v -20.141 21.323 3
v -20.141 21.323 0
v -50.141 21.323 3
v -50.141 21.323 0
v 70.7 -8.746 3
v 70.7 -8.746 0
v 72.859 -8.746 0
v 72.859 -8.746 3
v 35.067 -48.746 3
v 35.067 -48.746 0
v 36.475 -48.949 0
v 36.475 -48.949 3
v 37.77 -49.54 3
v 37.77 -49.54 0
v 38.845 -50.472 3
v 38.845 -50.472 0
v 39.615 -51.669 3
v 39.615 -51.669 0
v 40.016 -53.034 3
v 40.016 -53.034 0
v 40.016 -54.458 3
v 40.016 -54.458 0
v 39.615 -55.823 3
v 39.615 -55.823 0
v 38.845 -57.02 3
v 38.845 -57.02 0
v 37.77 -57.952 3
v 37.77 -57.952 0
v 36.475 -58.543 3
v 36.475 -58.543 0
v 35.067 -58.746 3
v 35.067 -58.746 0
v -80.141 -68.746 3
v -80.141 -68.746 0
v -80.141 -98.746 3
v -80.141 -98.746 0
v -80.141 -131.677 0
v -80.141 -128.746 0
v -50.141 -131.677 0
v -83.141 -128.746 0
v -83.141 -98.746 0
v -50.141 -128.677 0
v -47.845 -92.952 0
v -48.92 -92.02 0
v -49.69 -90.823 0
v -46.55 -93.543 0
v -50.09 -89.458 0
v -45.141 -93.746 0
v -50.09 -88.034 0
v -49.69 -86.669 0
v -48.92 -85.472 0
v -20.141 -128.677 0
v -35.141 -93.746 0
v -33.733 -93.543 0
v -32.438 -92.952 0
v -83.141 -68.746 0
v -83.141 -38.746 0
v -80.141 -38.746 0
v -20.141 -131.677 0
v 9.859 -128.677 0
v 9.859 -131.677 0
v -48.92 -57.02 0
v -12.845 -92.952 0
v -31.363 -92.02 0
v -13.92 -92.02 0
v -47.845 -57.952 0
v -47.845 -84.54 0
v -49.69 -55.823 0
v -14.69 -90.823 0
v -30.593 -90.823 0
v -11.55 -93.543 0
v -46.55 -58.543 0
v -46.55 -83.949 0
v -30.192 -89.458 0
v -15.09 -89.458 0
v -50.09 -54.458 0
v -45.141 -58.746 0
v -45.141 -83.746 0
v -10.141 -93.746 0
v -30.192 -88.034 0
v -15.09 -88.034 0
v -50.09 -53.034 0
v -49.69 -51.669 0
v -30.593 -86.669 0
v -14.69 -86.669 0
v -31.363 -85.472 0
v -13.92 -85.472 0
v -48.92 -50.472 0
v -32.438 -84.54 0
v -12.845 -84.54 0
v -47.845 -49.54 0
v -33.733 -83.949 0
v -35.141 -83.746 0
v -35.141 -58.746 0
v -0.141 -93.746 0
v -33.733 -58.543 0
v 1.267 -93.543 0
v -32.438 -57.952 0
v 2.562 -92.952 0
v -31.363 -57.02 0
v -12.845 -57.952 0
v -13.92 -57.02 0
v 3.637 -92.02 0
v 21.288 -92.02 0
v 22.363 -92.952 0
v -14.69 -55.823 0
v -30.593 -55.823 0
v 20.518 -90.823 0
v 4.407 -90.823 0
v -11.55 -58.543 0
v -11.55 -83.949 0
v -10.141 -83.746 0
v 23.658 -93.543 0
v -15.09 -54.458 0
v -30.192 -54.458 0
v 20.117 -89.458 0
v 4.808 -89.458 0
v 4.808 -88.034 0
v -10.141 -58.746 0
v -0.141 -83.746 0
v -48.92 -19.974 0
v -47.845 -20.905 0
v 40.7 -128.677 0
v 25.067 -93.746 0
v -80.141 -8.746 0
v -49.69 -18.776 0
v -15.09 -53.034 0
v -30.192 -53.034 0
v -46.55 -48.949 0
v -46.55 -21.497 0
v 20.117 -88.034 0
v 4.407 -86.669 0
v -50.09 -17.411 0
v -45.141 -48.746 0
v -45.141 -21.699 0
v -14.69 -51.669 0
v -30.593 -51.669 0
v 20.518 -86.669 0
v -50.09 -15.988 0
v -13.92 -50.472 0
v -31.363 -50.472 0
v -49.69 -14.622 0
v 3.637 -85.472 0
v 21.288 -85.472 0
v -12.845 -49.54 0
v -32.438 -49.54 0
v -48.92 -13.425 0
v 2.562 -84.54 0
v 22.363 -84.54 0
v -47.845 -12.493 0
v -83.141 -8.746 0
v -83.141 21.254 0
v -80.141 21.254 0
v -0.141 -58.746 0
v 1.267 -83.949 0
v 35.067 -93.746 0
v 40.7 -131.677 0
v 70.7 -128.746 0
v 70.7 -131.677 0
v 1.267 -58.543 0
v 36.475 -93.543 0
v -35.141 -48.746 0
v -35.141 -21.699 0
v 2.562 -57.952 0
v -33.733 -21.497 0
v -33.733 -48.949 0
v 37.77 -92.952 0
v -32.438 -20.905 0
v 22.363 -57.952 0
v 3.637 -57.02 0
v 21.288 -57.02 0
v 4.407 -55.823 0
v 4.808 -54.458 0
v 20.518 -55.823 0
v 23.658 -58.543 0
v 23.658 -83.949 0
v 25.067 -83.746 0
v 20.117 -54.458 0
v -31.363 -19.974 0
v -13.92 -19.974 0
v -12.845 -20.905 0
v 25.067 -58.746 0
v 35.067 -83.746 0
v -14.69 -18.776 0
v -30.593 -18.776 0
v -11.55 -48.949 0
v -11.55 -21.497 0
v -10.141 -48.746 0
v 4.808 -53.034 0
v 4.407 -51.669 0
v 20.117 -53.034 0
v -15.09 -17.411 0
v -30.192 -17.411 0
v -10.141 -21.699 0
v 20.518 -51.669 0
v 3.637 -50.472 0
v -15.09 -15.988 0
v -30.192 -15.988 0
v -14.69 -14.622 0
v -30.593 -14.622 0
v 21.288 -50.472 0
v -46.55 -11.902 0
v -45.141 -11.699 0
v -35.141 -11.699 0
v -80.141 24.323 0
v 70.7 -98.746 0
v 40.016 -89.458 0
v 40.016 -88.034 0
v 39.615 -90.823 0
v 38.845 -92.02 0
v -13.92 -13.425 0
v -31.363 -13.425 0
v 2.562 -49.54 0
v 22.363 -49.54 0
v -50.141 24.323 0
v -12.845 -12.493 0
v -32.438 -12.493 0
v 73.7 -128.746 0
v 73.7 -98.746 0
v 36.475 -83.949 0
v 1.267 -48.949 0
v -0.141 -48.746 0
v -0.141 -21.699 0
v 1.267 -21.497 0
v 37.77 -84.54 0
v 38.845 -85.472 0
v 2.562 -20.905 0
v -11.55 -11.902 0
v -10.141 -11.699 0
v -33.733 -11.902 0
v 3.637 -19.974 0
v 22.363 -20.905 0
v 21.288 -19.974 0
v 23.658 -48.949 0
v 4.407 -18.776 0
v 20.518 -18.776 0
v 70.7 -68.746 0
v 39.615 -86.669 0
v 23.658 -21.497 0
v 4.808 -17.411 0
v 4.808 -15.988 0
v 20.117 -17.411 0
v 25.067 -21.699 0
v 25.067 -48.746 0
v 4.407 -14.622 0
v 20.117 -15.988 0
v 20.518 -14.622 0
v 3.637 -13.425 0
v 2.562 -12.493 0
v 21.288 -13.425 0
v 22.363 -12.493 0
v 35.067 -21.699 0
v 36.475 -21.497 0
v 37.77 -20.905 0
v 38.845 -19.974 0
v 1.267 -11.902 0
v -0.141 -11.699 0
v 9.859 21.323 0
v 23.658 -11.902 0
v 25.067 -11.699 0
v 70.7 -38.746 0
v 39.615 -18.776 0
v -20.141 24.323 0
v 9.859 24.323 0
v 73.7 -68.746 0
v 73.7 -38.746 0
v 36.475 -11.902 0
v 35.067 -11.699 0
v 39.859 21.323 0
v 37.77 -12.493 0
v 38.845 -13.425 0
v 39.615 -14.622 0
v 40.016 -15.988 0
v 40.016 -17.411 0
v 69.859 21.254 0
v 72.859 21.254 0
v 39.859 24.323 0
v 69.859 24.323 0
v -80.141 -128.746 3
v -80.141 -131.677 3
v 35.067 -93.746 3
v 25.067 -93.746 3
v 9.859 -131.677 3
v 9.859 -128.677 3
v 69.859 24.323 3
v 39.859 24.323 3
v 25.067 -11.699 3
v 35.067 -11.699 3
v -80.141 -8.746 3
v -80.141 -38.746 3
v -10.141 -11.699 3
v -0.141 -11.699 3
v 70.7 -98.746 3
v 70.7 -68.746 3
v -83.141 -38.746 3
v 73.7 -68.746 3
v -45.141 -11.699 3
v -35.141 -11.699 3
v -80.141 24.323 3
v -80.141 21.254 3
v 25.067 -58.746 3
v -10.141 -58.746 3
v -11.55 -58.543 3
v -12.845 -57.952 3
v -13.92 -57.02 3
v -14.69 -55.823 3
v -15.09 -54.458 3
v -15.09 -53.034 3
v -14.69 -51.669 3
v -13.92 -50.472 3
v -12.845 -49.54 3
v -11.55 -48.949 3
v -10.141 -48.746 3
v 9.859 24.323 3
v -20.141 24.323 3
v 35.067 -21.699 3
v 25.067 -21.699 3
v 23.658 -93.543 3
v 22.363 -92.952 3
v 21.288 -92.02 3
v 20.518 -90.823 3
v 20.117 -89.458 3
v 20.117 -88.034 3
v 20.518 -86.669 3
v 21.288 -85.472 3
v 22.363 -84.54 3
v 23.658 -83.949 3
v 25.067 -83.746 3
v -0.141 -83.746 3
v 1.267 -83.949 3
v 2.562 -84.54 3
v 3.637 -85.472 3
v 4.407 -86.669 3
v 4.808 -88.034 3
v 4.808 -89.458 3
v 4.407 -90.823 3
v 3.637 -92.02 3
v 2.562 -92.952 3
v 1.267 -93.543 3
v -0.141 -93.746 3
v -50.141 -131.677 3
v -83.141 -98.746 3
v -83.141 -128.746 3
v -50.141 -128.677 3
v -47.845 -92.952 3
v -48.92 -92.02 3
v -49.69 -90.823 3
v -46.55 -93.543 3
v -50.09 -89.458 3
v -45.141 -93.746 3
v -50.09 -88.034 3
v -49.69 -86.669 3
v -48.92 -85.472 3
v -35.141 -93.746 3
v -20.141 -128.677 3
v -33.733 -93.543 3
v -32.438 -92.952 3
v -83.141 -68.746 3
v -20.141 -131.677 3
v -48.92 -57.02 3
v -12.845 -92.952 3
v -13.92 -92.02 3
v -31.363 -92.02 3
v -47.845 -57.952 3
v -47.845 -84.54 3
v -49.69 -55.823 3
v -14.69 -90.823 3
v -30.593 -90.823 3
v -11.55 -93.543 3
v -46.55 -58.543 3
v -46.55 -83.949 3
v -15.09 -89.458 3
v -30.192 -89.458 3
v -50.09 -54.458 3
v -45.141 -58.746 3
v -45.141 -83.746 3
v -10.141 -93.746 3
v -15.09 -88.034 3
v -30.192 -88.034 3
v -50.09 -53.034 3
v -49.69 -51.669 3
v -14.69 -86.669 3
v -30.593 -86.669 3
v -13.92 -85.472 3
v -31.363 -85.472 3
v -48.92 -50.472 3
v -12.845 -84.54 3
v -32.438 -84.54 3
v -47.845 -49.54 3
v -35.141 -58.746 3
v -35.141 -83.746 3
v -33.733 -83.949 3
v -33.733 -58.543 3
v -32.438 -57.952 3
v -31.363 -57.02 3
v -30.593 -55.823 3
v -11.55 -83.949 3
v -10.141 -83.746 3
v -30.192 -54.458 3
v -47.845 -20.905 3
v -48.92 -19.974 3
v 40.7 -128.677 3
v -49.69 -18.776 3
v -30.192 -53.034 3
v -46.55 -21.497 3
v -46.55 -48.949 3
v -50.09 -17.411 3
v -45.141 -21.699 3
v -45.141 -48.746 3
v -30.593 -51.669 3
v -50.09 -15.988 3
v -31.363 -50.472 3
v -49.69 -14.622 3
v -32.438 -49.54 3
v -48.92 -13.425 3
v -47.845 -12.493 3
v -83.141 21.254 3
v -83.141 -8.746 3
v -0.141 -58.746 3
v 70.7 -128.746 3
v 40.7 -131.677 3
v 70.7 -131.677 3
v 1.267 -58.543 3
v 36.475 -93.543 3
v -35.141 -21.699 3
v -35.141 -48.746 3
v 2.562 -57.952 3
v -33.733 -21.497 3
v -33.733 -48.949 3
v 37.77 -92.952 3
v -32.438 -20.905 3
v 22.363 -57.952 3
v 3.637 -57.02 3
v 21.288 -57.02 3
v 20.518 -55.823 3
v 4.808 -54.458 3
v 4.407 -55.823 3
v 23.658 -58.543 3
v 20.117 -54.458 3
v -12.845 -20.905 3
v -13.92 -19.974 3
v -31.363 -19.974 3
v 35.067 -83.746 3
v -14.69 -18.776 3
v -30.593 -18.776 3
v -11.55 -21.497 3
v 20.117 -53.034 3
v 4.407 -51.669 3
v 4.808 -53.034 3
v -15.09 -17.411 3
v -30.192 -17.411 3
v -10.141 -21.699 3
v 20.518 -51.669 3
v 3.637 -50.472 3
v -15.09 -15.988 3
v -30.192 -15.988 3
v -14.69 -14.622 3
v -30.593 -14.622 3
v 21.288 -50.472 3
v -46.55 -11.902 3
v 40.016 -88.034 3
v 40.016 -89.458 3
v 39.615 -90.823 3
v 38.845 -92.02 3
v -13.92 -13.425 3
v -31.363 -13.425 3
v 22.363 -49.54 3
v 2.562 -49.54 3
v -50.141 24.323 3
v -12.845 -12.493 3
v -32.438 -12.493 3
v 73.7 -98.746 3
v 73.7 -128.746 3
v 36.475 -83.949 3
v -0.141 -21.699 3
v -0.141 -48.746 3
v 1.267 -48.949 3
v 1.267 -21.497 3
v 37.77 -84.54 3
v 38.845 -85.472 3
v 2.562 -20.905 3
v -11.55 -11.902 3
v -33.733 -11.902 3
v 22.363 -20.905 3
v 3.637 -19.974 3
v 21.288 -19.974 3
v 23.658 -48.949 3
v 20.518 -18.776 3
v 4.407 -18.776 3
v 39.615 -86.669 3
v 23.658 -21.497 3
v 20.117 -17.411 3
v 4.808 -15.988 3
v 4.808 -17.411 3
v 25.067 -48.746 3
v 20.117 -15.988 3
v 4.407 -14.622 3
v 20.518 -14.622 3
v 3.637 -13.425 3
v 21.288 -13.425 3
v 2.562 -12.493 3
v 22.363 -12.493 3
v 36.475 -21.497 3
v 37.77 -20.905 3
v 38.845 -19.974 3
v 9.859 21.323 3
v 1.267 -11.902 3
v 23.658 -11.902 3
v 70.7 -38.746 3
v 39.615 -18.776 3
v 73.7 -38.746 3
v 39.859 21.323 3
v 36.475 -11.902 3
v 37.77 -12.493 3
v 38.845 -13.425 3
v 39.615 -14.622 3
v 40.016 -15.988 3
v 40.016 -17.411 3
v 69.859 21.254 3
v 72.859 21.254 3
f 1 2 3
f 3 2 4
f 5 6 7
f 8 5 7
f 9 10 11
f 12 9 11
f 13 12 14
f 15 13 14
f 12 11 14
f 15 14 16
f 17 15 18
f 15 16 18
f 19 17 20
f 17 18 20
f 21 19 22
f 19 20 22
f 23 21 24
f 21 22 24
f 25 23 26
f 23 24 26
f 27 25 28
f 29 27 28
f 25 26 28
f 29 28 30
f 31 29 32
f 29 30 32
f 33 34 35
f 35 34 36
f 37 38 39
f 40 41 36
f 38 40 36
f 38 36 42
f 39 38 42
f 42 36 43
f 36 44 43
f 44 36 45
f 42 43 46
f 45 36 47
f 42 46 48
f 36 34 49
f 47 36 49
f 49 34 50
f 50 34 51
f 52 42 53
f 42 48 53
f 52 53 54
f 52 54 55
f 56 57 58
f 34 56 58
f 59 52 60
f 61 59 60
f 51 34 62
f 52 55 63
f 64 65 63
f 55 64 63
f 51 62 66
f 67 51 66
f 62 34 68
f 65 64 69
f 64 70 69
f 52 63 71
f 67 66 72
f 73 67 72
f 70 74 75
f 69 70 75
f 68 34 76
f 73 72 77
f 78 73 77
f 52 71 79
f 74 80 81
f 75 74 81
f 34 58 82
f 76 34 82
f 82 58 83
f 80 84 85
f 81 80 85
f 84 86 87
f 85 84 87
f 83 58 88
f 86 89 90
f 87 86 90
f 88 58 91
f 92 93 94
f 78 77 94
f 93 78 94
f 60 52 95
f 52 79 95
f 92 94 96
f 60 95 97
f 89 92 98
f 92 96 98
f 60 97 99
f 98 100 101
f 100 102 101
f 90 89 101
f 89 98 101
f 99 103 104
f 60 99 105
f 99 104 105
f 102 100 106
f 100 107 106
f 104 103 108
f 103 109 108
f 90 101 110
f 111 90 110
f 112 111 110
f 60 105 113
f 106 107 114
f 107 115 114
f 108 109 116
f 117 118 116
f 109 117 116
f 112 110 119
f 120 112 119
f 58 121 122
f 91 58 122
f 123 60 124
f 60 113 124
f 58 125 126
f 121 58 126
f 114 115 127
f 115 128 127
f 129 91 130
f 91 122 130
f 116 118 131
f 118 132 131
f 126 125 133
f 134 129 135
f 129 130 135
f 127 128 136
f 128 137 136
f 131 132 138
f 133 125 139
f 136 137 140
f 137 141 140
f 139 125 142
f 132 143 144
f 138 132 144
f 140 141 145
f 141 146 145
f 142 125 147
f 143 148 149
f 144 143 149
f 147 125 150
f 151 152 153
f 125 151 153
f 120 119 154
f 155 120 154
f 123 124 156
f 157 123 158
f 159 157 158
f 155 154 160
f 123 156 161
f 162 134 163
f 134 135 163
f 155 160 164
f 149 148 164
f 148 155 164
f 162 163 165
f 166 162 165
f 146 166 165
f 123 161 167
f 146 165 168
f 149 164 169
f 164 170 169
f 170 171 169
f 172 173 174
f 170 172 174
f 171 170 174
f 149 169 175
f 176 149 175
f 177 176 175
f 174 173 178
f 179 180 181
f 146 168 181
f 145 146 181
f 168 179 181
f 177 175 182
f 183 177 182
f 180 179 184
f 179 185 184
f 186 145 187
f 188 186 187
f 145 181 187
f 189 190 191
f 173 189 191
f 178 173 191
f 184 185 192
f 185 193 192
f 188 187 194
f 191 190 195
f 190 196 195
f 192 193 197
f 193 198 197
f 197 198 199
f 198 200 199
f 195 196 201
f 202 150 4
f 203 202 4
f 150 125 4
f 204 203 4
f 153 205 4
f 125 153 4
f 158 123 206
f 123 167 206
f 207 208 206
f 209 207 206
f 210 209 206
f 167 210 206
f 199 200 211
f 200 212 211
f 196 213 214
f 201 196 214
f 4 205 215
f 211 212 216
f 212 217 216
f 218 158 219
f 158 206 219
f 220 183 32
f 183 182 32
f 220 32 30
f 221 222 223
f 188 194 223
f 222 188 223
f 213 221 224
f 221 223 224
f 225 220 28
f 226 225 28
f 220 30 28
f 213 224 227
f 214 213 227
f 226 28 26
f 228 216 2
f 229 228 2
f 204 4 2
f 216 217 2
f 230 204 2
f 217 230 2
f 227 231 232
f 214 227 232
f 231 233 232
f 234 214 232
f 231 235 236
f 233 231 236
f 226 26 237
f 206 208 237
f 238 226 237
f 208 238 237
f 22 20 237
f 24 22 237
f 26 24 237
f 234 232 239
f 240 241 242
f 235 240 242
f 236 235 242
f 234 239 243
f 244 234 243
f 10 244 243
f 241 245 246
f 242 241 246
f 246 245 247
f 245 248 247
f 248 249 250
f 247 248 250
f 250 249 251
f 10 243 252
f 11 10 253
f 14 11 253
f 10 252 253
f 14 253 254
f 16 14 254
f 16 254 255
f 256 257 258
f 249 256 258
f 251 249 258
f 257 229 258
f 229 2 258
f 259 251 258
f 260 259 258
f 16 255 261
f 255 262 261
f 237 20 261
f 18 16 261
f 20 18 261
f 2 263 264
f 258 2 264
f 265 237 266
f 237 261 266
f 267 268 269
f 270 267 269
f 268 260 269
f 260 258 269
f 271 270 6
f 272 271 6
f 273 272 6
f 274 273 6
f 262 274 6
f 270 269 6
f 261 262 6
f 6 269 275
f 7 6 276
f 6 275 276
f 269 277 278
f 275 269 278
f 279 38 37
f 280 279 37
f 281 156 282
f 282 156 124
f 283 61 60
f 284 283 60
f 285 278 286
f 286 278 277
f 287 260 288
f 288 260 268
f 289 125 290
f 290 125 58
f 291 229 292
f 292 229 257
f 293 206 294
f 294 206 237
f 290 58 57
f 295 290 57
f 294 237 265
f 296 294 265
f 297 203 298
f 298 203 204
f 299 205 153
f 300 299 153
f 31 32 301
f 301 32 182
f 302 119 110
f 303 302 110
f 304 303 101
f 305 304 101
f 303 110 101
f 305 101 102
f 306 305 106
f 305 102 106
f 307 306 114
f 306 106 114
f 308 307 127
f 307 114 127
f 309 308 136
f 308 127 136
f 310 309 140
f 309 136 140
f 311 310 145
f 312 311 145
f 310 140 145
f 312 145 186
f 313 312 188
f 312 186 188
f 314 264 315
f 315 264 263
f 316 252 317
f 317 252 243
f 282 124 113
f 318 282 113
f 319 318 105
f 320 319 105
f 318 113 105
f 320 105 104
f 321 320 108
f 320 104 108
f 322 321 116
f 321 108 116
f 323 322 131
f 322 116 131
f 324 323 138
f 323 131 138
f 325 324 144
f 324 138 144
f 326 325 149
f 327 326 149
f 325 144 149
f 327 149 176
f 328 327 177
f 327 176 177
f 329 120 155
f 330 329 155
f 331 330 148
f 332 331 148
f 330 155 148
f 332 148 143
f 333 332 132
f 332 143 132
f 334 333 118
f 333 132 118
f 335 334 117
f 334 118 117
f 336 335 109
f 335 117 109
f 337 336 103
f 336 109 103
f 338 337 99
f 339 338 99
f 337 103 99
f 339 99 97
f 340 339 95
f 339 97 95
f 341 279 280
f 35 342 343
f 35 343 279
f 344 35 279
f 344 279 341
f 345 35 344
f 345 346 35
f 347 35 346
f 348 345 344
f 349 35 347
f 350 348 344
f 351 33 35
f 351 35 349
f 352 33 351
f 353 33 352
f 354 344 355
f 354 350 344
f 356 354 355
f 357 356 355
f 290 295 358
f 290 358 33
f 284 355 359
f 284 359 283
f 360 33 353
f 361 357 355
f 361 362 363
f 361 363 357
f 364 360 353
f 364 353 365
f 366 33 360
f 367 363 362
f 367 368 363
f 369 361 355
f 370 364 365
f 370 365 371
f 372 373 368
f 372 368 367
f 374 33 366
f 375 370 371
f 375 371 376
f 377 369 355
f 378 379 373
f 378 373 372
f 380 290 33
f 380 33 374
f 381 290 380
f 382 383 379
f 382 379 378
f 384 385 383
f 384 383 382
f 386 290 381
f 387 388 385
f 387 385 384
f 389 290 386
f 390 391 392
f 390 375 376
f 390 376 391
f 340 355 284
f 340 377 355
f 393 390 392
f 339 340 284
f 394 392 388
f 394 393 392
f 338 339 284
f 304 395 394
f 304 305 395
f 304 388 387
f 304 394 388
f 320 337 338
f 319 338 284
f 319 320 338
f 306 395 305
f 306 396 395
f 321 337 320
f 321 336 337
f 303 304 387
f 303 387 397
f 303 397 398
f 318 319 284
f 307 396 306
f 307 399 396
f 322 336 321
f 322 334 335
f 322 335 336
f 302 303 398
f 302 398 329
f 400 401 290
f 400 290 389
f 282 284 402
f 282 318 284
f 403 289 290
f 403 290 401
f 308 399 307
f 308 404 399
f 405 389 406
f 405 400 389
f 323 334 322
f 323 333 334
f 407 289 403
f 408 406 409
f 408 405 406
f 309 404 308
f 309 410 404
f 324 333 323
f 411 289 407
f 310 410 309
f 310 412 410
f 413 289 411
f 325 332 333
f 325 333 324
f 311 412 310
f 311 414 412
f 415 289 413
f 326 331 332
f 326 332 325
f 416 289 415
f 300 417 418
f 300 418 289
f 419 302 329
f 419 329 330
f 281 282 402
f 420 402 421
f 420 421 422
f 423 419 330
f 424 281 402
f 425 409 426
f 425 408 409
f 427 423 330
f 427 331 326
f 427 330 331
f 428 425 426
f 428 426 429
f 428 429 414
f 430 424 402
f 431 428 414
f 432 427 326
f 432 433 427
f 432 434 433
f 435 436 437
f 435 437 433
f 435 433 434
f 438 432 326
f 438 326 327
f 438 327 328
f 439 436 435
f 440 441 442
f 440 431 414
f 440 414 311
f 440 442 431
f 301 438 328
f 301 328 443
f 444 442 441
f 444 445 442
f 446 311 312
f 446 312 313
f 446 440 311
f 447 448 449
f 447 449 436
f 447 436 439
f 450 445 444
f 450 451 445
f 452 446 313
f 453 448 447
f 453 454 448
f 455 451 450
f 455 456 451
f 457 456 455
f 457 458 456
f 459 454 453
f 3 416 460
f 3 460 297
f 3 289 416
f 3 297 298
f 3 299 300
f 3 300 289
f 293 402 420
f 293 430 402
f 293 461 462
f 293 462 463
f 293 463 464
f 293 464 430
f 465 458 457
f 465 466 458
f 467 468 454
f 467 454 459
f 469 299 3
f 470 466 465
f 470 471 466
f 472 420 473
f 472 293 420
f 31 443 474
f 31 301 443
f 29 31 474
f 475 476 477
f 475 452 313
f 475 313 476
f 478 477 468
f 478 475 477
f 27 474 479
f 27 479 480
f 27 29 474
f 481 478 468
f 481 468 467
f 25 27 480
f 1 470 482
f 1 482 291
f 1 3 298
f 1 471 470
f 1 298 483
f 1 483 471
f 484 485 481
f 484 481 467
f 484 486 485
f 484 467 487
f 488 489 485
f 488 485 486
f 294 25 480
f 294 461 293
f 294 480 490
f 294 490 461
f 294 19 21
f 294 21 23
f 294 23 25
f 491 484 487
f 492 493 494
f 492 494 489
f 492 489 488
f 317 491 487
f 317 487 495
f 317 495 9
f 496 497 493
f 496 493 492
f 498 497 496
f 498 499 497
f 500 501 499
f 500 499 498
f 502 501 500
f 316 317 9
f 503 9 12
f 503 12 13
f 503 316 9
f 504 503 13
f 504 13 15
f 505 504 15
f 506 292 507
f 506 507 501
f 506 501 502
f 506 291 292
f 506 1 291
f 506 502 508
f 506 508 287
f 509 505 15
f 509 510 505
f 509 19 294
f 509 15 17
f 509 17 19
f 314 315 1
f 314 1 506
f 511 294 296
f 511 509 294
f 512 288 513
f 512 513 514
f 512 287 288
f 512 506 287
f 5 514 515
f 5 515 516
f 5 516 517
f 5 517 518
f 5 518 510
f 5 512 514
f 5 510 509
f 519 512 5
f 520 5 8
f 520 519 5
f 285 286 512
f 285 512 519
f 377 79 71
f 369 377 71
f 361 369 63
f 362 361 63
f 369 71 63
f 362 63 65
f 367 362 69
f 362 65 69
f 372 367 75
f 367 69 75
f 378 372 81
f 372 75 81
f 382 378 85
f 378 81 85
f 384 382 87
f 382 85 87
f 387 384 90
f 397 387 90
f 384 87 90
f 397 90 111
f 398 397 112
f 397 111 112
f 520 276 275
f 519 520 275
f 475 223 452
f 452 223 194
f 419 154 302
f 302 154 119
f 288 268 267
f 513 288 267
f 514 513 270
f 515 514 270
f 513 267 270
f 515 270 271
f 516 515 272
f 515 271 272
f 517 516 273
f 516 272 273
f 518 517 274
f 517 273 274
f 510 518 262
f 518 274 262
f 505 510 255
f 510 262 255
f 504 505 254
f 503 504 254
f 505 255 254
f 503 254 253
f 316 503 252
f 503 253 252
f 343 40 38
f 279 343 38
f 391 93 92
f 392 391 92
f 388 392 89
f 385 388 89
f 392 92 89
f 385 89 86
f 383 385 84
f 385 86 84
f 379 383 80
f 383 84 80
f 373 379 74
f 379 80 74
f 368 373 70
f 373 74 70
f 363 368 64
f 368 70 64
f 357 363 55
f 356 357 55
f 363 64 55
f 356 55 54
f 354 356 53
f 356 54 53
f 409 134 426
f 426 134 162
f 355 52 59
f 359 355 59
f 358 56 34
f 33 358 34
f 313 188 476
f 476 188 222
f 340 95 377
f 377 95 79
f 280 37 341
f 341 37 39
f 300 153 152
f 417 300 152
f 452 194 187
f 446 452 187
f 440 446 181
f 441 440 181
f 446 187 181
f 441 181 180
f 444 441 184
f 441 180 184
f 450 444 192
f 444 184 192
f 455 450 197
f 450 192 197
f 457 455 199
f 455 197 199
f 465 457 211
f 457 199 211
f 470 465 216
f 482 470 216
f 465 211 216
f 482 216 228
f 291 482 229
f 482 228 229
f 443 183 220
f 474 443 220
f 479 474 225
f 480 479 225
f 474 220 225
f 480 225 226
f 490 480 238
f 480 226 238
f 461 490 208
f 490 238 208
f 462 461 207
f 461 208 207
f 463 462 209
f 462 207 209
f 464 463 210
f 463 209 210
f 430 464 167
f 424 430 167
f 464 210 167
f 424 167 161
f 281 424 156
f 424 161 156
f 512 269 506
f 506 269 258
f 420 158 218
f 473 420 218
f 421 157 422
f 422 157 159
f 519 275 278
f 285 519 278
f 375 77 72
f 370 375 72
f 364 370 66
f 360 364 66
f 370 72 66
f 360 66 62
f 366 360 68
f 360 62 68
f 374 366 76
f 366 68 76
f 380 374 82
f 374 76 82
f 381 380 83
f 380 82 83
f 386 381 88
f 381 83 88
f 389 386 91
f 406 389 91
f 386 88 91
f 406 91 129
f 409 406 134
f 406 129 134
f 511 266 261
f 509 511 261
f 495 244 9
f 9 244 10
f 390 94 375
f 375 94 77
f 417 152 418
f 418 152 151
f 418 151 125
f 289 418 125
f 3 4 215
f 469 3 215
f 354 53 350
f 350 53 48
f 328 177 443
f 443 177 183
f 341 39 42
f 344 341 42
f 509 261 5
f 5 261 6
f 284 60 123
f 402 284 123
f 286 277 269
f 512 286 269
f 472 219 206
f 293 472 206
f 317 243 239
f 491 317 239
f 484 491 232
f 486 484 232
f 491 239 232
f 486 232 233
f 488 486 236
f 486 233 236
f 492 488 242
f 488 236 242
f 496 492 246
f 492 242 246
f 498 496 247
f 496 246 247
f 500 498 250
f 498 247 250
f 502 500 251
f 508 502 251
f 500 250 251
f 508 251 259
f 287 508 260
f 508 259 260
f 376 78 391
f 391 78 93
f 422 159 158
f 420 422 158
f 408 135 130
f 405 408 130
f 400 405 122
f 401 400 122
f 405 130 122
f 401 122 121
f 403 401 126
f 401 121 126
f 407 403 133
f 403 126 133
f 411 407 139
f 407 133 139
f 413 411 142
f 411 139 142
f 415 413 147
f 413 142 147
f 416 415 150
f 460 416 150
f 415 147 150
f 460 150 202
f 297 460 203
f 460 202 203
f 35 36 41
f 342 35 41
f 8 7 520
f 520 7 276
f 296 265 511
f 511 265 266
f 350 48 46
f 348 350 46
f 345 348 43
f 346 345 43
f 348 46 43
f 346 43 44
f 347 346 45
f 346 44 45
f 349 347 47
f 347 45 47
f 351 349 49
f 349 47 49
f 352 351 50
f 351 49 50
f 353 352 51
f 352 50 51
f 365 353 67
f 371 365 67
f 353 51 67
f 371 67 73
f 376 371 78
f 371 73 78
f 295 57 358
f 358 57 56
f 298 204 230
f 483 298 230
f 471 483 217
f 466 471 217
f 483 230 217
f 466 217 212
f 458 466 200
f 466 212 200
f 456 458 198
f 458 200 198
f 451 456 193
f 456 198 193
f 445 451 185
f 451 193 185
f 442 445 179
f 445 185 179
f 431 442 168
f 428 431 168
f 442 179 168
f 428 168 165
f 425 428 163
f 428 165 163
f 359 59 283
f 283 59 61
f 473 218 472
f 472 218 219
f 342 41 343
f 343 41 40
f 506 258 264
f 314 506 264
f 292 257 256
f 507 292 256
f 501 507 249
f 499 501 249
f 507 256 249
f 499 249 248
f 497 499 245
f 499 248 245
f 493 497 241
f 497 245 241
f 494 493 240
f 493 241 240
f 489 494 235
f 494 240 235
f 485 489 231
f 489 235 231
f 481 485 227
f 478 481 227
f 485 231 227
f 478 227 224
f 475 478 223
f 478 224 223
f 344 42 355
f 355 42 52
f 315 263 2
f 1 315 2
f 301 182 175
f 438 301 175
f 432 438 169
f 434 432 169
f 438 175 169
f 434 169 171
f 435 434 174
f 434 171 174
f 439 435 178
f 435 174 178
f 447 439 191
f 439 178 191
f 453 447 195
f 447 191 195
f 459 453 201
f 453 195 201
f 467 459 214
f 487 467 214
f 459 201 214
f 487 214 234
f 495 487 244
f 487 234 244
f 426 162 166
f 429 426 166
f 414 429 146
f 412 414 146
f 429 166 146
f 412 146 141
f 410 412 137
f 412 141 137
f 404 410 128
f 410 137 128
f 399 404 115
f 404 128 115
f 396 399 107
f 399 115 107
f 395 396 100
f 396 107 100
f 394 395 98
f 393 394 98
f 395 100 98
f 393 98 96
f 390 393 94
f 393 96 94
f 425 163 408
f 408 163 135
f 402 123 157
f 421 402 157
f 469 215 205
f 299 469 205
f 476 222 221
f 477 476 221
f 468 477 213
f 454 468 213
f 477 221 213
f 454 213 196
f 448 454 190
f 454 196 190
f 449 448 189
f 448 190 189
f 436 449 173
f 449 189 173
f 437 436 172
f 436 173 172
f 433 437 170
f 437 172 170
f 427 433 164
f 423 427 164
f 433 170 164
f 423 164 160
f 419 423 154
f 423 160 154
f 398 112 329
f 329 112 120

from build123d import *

# Parameters (mm, degrees)
RESSALTO_EXTRUS_O1_DEPTH = 3


with BuildPart() as part:
    # Esboço1 → Ressalto-extrusão1 (new body)
    with BuildSketch(Plane.XY):
        Polygon((-80.141377403, 21.254023913), (-83.141377403, 21.254023913), (-83.141377403, -8.745976087), (-80.141377403, -8.745976087), (-80.141377403, -38.745976087), (-83.141377403, -38.745976087), (-83.141377403, -68.745976087), (-80.141377403, -68.745976087), (-80.141377403, -98.745976087), (-83.141377403, -98.745976087), (-83.141377403, -128.745976087), (-80.141377403, -128.745976087), (-80.141377403, -131.677493187), (-50.141377403, -131.677493187), (-50.141377403, -128.677493187), (-20.141377403, -128.677493187), (-20.141377403, -131.677493187), (9.858622597, -131.677493187), (9.858622597, -128.677493187), (40.700385396, -128.677493187), (40.700385396, -131.677493187), (70.700385396, -131.677493187), (70.700385396, -128.745976087), (73.700385396, -128.745976087), (73.700385396, -98.745976087), (70.700385396, -98.745976087), (70.700385396, -68.745976087), (73.700385396, -68.745976087), (73.700385396, -38.745976087), (70.700385396, -38.745976087), (70.700385396, -8.745976087), (72.858622597, -8.745976087), (72.858622597, 21.254023913), (69.858622597, 21.254023913), (69.858622597, 24.322506813), (39.858622597, 24.322506813), (39.858622597, 21.322506813), (9.858622597, 21.322506813), (9.858622597, 24.322506813), (-20.141377403, 24.322506813), (-20.141377403, 21.322506813), (-50.141377403, 21.322506813), (-50.141377403, 24.322506813), (-80.141377403, 24.322506813), align=None)
        with BuildLine():
            Line((35.066575056, -21.699226817), (25.066575056, -21.699226817))
            ThreePointArc((25.066575056, -21.699226817), (20.066575056, -16.699226817), (25.066575056, -11.699226817))
            Line((25.066575056, -11.699226817), (35.066575056, -11.699226817))
            ThreePointArc((35.066575056, -11.699226817), (40.066575056, -16.699226817), (35.066575056, -21.699226817))
        make_face(mode=Mode.SUBTRACT)
        with BuildLine():
            Line((-0.141377403, -21.699226817), (-10.141377403, -21.699226817))
            ThreePointArc((-10.141377403, -21.699226817), (-15.141377403, -16.699226817), (-10.141377403, -11.699226817))
            Line((-10.141377403, -11.699226817), (-0.141377403, -11.699226817))
            ThreePointArc((-0.141377403, -11.699226817), (4.858622597, -16.699226817), (-0.141377403, -21.699226817))
        make_face(mode=Mode.SUBTRACT)
        with BuildLine():
            Line((-35.141377403, -21.699226817), (-45.141377403, -21.699226817))
            ThreePointArc((-45.141377403, -21.699226817), (-50.141377403, -16.699226817), (-45.141377403, -11.699226817))
            Line((-45.141377403, -11.699226817), (-35.141377403, -11.699226817))
            ThreePointArc((-35.141377403, -11.699226817), (-30.141377403, -16.699226817), (-35.141377403, -21.699226817))
        make_face(mode=Mode.SUBTRACT)
        with BuildLine():
            Line((35.066575056, -58.745976087), (25.066575056, -58.745976087))
            ThreePointArc((25.066575056, -58.745976087), (20.066575056, -53.745976087), (25.066575056, -48.745976087))
            Line((25.066575056, -48.745976087), (35.066575056, -48.745976087))
            ThreePointArc((35.066575056, -48.745976087), (40.066575056, -53.745976087), (35.066575056, -58.745976087))
        make_face(mode=Mode.SUBTRACT)
        with BuildLine():
            Line((-0.141377403, -58.745976087), (-10.141377403, -58.745976087))
            ThreePointArc((-10.141377403, -58.745976087), (-15.141377403, -53.745976087), (-10.141377403, -48.745976087))
            Line((-10.141377403, -48.745976087), (-0.141377403, -48.745976087))
            ThreePointArc((-0.141377403, -48.745976087), (4.858622597, -53.745976087), (-0.141377403, -58.745976087))
        make_face(mode=Mode.SUBTRACT)
        with BuildLine():
            Line((-35.141377403, -58.745976087), (-45.141377403, -58.745976087))
            ThreePointArc((-45.141377403, -58.745976087), (-50.141377403, -53.745976087), (-45.141377403, -48.745976087))
            Line((-45.141377403, -48.745976087), (-35.141377403, -48.745976087))
            ThreePointArc((-35.141377403, -48.745976087), (-30.141377403, -53.745976087), (-35.141377403, -58.745976087))
        make_face(mode=Mode.SUBTRACT)
        with BuildLine():
            Line((35.066575056, -93.745976087), (25.066575056, -93.745976087))
            ThreePointArc((25.066575056, -93.745976087), (20.066575056, -88.745976087), (25.066575056, -83.745976087))
            Line((25.066575056, -83.745976087), (35.066575056, -83.745976087))
            ThreePointArc((35.066575056, -83.745976087), (40.066575056, -88.745976087), (35.066575056, -93.745976087))
        make_face(mode=Mode.SUBTRACT)
        with BuildLine():
            Line((-0.141377403, -93.745976087), (-10.141377403, -93.745976087))
            ThreePointArc((-10.141377403, -93.745976087), (-15.141377403, -88.745976087), (-10.141377403, -83.745976087))
            Line((-10.141377403, -83.745976087), (-0.141377403, -83.745976087))
            ThreePointArc((-0.141377403, -83.745976087), (4.858622597, -88.745976087), (-0.141377403, -93.745976087))
        make_face(mode=Mode.SUBTRACT)
        with BuildLine():
            Line((-35.141377403, -93.745976087), (-45.141377403, -93.745976087))
            ThreePointArc((-45.141377403, -93.745976087), (-50.141377403, -88.745976087), (-45.141377403, -83.745976087))
            Line((-45.141377403, -83.745976087), (-35.141377403, -83.745976087))
            ThreePointArc((-35.141377403, -83.745976087), (-30.141377403, -88.745976087), (-35.141377403, -93.745976087))
        make_face(mode=Mode.SUBTRACT)
    extrude(amount=RESSALTO_EXTRUS_O1_DEPTH)


solid = part.part
